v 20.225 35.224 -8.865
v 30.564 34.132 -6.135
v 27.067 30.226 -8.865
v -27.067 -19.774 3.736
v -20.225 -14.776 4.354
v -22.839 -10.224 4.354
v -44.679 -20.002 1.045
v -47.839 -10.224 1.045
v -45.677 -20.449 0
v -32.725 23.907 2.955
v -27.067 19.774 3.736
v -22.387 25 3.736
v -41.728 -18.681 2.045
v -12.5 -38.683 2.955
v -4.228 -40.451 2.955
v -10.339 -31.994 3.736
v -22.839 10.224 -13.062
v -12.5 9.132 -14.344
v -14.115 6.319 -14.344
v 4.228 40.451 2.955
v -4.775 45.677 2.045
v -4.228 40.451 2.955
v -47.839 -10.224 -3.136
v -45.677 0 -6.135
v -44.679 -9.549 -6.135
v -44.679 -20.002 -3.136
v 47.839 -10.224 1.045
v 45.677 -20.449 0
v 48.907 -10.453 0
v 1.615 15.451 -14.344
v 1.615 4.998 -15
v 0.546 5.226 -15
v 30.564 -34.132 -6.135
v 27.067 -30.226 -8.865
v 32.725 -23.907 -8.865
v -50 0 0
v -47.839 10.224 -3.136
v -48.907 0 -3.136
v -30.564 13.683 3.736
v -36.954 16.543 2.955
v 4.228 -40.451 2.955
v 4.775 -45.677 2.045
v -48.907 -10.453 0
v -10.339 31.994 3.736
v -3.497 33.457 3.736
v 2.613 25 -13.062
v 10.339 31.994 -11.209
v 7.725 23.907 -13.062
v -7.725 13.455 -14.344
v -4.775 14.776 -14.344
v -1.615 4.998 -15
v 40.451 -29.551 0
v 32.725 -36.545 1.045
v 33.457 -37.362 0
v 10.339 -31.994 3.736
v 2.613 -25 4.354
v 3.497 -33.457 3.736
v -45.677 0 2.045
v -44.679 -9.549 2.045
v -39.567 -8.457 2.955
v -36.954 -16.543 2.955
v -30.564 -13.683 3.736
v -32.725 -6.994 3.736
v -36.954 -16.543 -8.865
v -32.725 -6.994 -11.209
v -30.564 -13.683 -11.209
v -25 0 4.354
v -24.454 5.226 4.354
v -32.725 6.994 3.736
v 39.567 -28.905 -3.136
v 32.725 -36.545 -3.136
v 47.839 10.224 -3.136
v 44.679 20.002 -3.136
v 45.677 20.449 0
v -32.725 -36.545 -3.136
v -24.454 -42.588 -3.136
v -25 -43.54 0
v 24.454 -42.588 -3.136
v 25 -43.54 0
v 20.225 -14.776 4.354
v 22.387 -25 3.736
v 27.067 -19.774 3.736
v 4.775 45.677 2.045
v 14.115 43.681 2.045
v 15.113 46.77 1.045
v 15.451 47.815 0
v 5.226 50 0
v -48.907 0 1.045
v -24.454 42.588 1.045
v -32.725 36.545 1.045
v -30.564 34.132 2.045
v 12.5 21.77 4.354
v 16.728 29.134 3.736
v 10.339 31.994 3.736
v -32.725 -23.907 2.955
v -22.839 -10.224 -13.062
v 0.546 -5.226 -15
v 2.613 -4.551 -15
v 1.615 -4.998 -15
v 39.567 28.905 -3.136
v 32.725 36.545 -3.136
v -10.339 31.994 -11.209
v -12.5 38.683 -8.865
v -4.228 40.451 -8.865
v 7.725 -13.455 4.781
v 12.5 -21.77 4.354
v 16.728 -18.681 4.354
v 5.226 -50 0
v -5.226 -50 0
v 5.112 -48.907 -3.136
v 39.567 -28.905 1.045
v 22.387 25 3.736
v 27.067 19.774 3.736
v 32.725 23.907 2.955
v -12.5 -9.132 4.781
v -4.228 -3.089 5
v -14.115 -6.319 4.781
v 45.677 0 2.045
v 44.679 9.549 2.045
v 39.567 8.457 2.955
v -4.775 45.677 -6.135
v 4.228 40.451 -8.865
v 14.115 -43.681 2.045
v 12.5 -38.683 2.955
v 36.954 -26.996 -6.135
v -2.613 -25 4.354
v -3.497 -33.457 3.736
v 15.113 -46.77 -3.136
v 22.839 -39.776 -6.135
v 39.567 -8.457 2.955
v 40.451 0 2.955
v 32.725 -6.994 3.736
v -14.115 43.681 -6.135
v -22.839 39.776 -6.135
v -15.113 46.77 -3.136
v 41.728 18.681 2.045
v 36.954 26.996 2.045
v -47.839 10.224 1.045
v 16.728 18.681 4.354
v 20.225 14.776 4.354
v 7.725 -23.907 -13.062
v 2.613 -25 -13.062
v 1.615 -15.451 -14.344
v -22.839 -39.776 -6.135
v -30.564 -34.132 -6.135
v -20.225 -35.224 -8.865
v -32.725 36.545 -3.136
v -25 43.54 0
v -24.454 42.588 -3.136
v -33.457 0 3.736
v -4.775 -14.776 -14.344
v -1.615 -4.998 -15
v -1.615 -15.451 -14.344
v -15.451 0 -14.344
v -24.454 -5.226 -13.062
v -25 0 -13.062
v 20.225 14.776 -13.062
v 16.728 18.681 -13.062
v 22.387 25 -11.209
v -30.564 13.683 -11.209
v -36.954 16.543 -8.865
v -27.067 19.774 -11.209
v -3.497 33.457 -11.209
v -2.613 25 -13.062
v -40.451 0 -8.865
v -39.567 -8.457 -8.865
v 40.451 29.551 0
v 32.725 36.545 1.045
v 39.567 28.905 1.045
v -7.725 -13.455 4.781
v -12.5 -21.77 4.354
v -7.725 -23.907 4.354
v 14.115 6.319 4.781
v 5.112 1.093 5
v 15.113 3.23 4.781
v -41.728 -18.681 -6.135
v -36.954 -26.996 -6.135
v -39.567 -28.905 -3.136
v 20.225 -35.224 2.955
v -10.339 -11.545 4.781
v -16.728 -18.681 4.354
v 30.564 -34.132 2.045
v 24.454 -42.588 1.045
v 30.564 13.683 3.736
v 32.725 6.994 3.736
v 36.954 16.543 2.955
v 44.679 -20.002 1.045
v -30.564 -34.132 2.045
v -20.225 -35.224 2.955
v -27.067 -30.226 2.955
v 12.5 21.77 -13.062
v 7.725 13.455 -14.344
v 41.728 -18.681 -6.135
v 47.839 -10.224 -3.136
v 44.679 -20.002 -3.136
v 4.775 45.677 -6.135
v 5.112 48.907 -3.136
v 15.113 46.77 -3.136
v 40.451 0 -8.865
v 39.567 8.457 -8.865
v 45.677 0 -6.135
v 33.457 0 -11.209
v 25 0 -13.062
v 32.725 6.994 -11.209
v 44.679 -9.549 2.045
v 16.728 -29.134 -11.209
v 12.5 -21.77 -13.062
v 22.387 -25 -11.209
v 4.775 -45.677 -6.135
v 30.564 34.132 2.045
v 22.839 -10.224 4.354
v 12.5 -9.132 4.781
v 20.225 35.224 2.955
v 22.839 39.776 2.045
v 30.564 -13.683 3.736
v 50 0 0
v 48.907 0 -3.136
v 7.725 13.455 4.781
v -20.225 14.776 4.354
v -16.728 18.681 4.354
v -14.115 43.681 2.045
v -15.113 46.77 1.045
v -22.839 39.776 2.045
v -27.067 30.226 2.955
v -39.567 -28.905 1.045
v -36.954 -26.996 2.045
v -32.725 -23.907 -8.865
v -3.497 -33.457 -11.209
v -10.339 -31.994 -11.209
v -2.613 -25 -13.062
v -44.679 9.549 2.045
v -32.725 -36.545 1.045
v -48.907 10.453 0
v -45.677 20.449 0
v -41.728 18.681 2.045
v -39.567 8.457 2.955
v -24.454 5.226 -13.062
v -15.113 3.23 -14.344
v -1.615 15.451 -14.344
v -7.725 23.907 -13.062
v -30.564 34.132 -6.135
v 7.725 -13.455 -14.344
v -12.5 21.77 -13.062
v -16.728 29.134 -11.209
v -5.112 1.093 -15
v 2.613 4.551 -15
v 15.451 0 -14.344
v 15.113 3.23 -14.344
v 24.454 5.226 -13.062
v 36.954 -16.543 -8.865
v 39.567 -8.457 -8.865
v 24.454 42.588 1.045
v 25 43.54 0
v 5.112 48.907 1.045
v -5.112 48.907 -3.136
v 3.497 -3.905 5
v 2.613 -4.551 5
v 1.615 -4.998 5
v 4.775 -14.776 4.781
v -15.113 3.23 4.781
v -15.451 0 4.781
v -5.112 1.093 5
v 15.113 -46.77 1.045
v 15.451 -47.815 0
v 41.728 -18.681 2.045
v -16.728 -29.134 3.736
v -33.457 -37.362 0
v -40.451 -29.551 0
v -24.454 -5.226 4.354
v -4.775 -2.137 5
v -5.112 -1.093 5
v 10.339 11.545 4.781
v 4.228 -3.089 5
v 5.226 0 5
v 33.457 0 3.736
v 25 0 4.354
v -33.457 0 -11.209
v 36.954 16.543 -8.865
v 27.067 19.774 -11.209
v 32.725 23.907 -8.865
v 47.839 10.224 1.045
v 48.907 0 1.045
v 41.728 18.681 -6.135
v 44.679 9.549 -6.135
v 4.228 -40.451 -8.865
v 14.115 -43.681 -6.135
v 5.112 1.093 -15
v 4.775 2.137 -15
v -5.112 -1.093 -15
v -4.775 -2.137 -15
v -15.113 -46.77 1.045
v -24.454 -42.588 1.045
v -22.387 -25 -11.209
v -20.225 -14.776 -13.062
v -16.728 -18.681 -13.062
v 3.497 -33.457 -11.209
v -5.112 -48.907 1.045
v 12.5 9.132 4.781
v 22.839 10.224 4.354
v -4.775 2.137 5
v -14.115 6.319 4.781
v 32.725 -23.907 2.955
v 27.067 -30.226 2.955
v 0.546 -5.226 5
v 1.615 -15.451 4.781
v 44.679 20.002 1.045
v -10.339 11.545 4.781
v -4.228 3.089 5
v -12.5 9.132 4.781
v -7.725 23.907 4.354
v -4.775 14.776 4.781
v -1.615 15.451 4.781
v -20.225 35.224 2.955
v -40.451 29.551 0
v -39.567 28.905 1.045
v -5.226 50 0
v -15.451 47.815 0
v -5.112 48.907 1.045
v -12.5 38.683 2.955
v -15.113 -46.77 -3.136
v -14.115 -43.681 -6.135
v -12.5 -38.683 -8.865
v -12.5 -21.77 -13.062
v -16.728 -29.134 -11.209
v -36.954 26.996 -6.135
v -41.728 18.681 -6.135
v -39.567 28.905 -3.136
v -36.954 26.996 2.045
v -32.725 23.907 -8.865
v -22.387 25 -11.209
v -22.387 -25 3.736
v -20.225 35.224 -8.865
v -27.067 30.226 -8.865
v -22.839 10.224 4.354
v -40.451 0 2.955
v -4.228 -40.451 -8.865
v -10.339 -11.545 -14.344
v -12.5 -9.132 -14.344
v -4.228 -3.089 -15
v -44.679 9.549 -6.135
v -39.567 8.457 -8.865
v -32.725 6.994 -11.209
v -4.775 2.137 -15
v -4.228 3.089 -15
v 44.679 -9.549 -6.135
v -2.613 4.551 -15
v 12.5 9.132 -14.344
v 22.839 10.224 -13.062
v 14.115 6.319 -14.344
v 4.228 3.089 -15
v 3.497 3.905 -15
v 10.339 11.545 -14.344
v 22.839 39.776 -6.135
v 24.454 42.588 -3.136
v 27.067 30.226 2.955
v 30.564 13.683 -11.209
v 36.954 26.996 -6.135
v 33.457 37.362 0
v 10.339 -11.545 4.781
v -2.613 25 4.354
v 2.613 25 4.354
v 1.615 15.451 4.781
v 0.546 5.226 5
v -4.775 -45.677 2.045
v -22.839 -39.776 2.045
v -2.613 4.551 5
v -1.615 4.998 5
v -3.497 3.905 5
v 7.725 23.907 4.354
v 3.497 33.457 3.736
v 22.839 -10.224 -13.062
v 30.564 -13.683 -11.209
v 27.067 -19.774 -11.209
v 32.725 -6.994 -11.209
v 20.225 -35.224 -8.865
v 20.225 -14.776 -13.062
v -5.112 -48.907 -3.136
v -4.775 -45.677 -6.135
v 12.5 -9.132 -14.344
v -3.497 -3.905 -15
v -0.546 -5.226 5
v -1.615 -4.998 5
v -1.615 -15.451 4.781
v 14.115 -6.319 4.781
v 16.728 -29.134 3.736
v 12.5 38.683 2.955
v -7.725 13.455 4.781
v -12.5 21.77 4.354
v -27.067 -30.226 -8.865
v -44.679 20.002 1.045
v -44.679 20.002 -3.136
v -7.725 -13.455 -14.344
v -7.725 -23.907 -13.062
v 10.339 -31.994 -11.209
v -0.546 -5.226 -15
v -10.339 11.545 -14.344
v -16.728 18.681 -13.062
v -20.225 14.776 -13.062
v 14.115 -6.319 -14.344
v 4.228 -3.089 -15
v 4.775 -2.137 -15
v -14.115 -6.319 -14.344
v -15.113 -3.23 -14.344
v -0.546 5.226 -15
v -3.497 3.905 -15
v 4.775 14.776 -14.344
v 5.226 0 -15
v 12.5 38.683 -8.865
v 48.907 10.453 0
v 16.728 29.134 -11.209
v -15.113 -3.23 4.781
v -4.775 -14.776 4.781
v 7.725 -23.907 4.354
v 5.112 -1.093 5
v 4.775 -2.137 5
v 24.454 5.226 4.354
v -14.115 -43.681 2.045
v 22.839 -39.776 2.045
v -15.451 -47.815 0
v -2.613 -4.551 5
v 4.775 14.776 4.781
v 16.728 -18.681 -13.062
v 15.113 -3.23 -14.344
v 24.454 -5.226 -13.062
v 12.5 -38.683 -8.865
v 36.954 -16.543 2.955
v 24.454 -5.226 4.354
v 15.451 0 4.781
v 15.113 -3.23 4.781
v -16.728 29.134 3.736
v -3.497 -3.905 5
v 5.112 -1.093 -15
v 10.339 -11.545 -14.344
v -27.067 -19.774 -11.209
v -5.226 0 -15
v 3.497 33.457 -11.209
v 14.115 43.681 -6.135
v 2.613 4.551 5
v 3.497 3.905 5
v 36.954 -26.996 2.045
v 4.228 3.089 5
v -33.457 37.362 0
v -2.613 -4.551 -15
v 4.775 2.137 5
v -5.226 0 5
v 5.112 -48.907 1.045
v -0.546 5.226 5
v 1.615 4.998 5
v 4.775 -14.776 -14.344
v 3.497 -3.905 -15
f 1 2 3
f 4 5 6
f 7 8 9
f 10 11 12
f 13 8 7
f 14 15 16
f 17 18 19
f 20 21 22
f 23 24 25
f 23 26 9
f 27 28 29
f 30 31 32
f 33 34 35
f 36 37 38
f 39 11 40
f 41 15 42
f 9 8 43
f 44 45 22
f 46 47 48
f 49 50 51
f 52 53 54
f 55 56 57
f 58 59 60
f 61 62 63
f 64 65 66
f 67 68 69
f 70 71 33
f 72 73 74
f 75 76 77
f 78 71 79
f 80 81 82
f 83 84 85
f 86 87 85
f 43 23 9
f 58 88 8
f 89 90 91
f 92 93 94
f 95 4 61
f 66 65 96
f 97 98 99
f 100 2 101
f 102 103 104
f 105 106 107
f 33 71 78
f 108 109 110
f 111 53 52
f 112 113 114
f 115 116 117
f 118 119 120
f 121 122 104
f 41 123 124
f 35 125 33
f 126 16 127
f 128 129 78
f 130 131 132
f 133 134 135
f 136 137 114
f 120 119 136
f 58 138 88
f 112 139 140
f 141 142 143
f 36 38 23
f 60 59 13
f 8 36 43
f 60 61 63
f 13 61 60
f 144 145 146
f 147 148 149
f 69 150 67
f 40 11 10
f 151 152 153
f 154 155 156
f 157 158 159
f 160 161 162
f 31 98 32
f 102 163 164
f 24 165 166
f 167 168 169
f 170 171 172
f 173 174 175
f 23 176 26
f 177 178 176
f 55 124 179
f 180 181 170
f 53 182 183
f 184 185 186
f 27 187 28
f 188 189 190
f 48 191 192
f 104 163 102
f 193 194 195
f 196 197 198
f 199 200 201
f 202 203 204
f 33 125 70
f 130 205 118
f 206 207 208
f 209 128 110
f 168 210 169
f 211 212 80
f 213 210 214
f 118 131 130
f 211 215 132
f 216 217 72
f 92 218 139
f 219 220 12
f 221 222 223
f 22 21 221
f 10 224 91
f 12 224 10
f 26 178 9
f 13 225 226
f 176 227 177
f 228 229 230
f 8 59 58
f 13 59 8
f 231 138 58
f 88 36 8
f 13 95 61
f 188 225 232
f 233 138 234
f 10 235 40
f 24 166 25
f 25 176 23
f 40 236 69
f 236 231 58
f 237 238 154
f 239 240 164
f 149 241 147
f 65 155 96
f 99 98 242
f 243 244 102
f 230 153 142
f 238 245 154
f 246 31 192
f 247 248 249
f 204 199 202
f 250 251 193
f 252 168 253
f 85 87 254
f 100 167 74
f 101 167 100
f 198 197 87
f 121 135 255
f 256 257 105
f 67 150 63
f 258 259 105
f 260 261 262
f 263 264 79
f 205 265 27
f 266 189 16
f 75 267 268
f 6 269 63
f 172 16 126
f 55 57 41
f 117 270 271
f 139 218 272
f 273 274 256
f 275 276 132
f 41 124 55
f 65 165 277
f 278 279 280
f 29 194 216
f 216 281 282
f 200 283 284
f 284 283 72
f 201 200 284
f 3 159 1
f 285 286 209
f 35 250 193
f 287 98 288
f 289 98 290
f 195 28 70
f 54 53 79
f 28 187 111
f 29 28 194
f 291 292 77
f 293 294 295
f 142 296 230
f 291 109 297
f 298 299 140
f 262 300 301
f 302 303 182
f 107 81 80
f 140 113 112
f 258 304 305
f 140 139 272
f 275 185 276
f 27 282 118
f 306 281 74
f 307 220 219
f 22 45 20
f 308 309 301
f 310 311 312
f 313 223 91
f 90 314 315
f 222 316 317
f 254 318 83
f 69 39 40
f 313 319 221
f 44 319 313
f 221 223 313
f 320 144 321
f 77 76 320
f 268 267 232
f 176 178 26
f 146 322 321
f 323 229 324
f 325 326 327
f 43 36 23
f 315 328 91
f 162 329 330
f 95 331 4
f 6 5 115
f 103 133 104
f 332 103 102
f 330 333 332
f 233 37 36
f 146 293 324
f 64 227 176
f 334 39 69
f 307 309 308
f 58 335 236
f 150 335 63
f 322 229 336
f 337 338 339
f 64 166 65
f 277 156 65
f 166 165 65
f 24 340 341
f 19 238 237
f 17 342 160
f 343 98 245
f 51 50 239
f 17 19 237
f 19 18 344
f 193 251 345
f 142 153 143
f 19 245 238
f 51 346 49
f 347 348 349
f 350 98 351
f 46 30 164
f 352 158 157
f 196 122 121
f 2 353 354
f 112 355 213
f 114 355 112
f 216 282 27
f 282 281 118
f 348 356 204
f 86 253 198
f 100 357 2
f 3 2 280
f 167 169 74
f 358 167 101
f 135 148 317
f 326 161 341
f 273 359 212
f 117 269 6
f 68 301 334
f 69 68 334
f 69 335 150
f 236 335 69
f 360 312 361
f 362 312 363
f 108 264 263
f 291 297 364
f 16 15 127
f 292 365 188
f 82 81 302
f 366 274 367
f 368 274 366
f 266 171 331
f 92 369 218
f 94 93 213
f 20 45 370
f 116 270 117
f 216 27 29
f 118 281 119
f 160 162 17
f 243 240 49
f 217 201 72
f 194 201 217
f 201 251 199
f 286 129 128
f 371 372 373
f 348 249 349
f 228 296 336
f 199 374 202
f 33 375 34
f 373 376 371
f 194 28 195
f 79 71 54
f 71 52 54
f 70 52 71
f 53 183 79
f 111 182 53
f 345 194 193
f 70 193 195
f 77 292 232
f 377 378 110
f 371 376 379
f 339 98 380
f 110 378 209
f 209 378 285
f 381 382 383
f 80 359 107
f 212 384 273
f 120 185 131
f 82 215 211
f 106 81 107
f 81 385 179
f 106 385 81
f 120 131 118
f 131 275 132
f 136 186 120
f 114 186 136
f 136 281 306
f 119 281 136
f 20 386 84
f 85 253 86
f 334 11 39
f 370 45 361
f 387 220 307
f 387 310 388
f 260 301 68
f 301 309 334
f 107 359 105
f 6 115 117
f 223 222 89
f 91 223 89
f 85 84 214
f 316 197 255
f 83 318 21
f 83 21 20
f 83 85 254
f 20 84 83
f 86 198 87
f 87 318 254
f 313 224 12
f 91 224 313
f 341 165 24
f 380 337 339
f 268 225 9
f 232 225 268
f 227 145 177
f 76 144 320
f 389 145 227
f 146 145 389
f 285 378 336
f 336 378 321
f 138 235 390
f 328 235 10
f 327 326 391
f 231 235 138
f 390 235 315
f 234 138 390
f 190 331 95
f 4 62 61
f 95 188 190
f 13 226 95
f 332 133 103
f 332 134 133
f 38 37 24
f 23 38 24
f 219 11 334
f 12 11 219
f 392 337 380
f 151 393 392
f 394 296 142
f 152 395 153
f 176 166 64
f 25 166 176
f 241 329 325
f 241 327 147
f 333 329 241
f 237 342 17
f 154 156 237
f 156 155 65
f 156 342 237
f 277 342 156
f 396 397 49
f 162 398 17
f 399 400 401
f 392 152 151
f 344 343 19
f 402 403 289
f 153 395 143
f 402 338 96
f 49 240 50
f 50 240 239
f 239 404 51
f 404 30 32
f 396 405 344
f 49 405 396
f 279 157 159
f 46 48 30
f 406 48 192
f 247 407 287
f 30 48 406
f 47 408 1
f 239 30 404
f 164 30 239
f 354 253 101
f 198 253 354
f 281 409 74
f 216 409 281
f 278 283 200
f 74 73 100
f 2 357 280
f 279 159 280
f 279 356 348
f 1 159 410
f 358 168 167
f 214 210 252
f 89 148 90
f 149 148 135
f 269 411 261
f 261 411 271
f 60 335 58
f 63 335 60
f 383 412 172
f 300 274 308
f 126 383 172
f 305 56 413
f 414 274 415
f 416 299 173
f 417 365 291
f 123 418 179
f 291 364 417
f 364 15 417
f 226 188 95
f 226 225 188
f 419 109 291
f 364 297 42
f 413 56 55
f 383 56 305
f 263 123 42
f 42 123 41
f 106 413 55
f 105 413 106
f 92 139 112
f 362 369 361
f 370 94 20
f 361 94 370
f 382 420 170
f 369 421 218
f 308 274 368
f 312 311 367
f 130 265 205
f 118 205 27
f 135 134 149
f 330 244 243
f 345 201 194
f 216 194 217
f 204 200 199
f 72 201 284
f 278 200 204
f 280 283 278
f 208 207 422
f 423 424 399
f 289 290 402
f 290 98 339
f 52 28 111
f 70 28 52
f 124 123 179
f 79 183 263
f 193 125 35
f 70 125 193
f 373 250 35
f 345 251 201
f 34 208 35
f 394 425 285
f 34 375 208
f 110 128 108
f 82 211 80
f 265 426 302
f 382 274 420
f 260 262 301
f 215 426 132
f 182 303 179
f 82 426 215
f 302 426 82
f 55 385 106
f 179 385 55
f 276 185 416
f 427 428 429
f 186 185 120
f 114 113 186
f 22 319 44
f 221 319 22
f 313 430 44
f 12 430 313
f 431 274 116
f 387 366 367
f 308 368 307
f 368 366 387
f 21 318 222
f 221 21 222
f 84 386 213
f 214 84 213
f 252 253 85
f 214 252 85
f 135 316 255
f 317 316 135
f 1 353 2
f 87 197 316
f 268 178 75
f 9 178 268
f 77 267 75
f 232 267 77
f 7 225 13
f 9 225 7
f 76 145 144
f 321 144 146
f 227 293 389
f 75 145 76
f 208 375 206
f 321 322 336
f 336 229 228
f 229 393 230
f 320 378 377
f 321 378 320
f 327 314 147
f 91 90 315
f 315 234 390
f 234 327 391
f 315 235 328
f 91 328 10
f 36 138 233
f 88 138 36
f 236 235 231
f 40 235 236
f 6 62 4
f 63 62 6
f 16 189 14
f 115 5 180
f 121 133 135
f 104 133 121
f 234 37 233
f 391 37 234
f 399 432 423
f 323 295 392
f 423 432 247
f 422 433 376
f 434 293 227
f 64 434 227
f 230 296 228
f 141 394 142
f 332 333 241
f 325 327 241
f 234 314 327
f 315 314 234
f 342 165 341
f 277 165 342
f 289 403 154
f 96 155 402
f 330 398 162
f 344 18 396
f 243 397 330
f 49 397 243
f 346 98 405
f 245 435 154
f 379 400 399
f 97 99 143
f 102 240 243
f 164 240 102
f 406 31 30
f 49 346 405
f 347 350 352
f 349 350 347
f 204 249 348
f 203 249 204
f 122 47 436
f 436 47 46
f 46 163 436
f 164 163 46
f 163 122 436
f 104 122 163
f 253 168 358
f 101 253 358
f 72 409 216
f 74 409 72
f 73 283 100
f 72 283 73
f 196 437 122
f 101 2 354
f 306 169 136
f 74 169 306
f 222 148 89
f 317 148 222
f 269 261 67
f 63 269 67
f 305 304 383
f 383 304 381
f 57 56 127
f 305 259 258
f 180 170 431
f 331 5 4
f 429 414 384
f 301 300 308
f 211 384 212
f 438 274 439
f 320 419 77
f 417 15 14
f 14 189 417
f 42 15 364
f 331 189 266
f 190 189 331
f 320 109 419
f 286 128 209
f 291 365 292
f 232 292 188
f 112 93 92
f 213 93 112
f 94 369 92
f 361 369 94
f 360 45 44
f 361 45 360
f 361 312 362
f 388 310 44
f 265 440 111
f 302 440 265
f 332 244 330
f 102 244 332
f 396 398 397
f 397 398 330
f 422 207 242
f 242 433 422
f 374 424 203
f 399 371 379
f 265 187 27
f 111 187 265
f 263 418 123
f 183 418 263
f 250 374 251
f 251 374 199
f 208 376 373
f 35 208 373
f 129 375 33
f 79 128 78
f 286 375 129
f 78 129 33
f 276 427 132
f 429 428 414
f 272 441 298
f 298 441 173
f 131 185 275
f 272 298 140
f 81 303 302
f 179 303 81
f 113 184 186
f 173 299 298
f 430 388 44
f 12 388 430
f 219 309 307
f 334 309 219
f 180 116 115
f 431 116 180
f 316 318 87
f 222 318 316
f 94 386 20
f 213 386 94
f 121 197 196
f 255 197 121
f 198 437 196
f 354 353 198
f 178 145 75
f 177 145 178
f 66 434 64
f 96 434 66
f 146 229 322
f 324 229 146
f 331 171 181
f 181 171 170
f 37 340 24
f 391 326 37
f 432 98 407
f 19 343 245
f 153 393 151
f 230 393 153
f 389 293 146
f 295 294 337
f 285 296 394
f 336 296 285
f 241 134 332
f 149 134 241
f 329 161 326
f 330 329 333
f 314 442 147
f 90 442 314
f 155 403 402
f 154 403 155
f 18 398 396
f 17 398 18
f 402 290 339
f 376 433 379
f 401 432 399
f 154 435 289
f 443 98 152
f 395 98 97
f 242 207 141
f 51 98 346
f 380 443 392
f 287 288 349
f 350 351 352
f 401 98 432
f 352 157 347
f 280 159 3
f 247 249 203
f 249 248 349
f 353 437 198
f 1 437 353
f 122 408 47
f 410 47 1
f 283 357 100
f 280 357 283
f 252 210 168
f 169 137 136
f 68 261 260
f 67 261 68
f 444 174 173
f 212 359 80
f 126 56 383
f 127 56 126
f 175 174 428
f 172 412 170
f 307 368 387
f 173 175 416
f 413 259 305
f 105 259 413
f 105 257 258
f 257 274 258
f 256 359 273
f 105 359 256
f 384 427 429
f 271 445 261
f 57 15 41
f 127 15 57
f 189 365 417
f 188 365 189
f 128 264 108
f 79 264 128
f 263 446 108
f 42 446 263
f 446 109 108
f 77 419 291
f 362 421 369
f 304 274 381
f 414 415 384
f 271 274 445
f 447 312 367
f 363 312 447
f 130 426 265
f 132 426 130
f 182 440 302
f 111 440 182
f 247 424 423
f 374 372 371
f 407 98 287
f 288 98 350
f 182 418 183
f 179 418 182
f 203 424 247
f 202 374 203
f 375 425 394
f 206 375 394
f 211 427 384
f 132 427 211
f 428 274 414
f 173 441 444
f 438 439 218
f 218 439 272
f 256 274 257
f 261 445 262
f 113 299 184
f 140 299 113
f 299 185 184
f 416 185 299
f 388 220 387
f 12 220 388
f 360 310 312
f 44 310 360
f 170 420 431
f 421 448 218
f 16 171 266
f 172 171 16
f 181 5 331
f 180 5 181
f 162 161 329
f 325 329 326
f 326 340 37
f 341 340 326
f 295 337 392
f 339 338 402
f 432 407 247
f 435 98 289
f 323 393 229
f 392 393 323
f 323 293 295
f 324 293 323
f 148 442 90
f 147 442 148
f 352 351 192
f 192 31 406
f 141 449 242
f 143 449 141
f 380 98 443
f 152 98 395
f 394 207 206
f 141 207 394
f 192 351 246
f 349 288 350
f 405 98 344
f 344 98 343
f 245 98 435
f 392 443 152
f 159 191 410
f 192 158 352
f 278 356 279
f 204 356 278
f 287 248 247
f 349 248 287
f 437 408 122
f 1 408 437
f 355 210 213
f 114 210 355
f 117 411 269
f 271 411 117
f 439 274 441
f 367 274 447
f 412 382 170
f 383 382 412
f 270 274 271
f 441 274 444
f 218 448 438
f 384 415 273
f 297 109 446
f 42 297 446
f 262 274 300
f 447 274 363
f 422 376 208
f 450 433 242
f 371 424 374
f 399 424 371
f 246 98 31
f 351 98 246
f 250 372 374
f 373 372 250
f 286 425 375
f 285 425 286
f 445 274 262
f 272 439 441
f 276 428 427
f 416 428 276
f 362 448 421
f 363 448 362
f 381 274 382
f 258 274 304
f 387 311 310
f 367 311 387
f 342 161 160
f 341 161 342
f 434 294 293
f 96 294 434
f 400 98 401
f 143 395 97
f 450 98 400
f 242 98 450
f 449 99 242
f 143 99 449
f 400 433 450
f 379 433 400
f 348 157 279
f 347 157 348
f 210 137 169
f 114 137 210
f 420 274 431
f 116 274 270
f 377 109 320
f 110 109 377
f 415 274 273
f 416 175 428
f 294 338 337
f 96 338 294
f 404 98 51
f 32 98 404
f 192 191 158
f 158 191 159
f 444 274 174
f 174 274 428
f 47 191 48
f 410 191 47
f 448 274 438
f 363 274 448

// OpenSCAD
//fn=150;
module convex (length,lensRad1,lensRad2,dist){ //Generates a convex lens, takes arguments length (radius of lens lengthwise), lensrad1 (radius of lens side 1 from center),lensrad2 (radius of lens side 2 from center), dist (added distance between rim of each side of lens)
	hull(){
		union(){
			intersection(){
				resize(newsize=[2*length,2*length,lensRad1])sphere(r=100);
				cylinder(lensRad1,length+1,length+1);
			}
			cylinder(dist,length,length);
			difference(){
				translate([0,0,dist])resize(newsize=[2*length,2*length,lensRad2])sphere(r=100);
				cylinder(lensRad2,length+1,length+1);}
		}
	}
}
module concave(length,lensRad1,lensRad2,dist){//Generates a concave lens, takes the same arguments as concave lens, but computes subtractively

	difference(){
	difference(){
	cylinder((lensRad1+lensRad2)/2+dist,length,length);
	resize(newsize=[2*length,2*length,lensRad1])sphere(r=100);}
	translate([0,0,dist+((lensRad1+lensRad2)/2)])resize(newsize=[2*length,2*length,lensRad2])sphere(r=100);}
	
}
module vexcave(length,lensRad1,lensRad2,dist){//Generates a concave lens, takes the same arguments as concave lens, but computes subtractively
	union(){
	difference(){
	cylinder((lensRad1+lensRad2)/2+dist,length,length);
	resize(newsize=[2*length,2*length,lensRad1])sphere(r=100);}
	
	translate([0,0,dist+((lensRad1+lensRad2)/2)])resize(newsize=[2*length,2*length,lensRad2])sphere(r=100);}
	
}


convex(50,10,30,0);
